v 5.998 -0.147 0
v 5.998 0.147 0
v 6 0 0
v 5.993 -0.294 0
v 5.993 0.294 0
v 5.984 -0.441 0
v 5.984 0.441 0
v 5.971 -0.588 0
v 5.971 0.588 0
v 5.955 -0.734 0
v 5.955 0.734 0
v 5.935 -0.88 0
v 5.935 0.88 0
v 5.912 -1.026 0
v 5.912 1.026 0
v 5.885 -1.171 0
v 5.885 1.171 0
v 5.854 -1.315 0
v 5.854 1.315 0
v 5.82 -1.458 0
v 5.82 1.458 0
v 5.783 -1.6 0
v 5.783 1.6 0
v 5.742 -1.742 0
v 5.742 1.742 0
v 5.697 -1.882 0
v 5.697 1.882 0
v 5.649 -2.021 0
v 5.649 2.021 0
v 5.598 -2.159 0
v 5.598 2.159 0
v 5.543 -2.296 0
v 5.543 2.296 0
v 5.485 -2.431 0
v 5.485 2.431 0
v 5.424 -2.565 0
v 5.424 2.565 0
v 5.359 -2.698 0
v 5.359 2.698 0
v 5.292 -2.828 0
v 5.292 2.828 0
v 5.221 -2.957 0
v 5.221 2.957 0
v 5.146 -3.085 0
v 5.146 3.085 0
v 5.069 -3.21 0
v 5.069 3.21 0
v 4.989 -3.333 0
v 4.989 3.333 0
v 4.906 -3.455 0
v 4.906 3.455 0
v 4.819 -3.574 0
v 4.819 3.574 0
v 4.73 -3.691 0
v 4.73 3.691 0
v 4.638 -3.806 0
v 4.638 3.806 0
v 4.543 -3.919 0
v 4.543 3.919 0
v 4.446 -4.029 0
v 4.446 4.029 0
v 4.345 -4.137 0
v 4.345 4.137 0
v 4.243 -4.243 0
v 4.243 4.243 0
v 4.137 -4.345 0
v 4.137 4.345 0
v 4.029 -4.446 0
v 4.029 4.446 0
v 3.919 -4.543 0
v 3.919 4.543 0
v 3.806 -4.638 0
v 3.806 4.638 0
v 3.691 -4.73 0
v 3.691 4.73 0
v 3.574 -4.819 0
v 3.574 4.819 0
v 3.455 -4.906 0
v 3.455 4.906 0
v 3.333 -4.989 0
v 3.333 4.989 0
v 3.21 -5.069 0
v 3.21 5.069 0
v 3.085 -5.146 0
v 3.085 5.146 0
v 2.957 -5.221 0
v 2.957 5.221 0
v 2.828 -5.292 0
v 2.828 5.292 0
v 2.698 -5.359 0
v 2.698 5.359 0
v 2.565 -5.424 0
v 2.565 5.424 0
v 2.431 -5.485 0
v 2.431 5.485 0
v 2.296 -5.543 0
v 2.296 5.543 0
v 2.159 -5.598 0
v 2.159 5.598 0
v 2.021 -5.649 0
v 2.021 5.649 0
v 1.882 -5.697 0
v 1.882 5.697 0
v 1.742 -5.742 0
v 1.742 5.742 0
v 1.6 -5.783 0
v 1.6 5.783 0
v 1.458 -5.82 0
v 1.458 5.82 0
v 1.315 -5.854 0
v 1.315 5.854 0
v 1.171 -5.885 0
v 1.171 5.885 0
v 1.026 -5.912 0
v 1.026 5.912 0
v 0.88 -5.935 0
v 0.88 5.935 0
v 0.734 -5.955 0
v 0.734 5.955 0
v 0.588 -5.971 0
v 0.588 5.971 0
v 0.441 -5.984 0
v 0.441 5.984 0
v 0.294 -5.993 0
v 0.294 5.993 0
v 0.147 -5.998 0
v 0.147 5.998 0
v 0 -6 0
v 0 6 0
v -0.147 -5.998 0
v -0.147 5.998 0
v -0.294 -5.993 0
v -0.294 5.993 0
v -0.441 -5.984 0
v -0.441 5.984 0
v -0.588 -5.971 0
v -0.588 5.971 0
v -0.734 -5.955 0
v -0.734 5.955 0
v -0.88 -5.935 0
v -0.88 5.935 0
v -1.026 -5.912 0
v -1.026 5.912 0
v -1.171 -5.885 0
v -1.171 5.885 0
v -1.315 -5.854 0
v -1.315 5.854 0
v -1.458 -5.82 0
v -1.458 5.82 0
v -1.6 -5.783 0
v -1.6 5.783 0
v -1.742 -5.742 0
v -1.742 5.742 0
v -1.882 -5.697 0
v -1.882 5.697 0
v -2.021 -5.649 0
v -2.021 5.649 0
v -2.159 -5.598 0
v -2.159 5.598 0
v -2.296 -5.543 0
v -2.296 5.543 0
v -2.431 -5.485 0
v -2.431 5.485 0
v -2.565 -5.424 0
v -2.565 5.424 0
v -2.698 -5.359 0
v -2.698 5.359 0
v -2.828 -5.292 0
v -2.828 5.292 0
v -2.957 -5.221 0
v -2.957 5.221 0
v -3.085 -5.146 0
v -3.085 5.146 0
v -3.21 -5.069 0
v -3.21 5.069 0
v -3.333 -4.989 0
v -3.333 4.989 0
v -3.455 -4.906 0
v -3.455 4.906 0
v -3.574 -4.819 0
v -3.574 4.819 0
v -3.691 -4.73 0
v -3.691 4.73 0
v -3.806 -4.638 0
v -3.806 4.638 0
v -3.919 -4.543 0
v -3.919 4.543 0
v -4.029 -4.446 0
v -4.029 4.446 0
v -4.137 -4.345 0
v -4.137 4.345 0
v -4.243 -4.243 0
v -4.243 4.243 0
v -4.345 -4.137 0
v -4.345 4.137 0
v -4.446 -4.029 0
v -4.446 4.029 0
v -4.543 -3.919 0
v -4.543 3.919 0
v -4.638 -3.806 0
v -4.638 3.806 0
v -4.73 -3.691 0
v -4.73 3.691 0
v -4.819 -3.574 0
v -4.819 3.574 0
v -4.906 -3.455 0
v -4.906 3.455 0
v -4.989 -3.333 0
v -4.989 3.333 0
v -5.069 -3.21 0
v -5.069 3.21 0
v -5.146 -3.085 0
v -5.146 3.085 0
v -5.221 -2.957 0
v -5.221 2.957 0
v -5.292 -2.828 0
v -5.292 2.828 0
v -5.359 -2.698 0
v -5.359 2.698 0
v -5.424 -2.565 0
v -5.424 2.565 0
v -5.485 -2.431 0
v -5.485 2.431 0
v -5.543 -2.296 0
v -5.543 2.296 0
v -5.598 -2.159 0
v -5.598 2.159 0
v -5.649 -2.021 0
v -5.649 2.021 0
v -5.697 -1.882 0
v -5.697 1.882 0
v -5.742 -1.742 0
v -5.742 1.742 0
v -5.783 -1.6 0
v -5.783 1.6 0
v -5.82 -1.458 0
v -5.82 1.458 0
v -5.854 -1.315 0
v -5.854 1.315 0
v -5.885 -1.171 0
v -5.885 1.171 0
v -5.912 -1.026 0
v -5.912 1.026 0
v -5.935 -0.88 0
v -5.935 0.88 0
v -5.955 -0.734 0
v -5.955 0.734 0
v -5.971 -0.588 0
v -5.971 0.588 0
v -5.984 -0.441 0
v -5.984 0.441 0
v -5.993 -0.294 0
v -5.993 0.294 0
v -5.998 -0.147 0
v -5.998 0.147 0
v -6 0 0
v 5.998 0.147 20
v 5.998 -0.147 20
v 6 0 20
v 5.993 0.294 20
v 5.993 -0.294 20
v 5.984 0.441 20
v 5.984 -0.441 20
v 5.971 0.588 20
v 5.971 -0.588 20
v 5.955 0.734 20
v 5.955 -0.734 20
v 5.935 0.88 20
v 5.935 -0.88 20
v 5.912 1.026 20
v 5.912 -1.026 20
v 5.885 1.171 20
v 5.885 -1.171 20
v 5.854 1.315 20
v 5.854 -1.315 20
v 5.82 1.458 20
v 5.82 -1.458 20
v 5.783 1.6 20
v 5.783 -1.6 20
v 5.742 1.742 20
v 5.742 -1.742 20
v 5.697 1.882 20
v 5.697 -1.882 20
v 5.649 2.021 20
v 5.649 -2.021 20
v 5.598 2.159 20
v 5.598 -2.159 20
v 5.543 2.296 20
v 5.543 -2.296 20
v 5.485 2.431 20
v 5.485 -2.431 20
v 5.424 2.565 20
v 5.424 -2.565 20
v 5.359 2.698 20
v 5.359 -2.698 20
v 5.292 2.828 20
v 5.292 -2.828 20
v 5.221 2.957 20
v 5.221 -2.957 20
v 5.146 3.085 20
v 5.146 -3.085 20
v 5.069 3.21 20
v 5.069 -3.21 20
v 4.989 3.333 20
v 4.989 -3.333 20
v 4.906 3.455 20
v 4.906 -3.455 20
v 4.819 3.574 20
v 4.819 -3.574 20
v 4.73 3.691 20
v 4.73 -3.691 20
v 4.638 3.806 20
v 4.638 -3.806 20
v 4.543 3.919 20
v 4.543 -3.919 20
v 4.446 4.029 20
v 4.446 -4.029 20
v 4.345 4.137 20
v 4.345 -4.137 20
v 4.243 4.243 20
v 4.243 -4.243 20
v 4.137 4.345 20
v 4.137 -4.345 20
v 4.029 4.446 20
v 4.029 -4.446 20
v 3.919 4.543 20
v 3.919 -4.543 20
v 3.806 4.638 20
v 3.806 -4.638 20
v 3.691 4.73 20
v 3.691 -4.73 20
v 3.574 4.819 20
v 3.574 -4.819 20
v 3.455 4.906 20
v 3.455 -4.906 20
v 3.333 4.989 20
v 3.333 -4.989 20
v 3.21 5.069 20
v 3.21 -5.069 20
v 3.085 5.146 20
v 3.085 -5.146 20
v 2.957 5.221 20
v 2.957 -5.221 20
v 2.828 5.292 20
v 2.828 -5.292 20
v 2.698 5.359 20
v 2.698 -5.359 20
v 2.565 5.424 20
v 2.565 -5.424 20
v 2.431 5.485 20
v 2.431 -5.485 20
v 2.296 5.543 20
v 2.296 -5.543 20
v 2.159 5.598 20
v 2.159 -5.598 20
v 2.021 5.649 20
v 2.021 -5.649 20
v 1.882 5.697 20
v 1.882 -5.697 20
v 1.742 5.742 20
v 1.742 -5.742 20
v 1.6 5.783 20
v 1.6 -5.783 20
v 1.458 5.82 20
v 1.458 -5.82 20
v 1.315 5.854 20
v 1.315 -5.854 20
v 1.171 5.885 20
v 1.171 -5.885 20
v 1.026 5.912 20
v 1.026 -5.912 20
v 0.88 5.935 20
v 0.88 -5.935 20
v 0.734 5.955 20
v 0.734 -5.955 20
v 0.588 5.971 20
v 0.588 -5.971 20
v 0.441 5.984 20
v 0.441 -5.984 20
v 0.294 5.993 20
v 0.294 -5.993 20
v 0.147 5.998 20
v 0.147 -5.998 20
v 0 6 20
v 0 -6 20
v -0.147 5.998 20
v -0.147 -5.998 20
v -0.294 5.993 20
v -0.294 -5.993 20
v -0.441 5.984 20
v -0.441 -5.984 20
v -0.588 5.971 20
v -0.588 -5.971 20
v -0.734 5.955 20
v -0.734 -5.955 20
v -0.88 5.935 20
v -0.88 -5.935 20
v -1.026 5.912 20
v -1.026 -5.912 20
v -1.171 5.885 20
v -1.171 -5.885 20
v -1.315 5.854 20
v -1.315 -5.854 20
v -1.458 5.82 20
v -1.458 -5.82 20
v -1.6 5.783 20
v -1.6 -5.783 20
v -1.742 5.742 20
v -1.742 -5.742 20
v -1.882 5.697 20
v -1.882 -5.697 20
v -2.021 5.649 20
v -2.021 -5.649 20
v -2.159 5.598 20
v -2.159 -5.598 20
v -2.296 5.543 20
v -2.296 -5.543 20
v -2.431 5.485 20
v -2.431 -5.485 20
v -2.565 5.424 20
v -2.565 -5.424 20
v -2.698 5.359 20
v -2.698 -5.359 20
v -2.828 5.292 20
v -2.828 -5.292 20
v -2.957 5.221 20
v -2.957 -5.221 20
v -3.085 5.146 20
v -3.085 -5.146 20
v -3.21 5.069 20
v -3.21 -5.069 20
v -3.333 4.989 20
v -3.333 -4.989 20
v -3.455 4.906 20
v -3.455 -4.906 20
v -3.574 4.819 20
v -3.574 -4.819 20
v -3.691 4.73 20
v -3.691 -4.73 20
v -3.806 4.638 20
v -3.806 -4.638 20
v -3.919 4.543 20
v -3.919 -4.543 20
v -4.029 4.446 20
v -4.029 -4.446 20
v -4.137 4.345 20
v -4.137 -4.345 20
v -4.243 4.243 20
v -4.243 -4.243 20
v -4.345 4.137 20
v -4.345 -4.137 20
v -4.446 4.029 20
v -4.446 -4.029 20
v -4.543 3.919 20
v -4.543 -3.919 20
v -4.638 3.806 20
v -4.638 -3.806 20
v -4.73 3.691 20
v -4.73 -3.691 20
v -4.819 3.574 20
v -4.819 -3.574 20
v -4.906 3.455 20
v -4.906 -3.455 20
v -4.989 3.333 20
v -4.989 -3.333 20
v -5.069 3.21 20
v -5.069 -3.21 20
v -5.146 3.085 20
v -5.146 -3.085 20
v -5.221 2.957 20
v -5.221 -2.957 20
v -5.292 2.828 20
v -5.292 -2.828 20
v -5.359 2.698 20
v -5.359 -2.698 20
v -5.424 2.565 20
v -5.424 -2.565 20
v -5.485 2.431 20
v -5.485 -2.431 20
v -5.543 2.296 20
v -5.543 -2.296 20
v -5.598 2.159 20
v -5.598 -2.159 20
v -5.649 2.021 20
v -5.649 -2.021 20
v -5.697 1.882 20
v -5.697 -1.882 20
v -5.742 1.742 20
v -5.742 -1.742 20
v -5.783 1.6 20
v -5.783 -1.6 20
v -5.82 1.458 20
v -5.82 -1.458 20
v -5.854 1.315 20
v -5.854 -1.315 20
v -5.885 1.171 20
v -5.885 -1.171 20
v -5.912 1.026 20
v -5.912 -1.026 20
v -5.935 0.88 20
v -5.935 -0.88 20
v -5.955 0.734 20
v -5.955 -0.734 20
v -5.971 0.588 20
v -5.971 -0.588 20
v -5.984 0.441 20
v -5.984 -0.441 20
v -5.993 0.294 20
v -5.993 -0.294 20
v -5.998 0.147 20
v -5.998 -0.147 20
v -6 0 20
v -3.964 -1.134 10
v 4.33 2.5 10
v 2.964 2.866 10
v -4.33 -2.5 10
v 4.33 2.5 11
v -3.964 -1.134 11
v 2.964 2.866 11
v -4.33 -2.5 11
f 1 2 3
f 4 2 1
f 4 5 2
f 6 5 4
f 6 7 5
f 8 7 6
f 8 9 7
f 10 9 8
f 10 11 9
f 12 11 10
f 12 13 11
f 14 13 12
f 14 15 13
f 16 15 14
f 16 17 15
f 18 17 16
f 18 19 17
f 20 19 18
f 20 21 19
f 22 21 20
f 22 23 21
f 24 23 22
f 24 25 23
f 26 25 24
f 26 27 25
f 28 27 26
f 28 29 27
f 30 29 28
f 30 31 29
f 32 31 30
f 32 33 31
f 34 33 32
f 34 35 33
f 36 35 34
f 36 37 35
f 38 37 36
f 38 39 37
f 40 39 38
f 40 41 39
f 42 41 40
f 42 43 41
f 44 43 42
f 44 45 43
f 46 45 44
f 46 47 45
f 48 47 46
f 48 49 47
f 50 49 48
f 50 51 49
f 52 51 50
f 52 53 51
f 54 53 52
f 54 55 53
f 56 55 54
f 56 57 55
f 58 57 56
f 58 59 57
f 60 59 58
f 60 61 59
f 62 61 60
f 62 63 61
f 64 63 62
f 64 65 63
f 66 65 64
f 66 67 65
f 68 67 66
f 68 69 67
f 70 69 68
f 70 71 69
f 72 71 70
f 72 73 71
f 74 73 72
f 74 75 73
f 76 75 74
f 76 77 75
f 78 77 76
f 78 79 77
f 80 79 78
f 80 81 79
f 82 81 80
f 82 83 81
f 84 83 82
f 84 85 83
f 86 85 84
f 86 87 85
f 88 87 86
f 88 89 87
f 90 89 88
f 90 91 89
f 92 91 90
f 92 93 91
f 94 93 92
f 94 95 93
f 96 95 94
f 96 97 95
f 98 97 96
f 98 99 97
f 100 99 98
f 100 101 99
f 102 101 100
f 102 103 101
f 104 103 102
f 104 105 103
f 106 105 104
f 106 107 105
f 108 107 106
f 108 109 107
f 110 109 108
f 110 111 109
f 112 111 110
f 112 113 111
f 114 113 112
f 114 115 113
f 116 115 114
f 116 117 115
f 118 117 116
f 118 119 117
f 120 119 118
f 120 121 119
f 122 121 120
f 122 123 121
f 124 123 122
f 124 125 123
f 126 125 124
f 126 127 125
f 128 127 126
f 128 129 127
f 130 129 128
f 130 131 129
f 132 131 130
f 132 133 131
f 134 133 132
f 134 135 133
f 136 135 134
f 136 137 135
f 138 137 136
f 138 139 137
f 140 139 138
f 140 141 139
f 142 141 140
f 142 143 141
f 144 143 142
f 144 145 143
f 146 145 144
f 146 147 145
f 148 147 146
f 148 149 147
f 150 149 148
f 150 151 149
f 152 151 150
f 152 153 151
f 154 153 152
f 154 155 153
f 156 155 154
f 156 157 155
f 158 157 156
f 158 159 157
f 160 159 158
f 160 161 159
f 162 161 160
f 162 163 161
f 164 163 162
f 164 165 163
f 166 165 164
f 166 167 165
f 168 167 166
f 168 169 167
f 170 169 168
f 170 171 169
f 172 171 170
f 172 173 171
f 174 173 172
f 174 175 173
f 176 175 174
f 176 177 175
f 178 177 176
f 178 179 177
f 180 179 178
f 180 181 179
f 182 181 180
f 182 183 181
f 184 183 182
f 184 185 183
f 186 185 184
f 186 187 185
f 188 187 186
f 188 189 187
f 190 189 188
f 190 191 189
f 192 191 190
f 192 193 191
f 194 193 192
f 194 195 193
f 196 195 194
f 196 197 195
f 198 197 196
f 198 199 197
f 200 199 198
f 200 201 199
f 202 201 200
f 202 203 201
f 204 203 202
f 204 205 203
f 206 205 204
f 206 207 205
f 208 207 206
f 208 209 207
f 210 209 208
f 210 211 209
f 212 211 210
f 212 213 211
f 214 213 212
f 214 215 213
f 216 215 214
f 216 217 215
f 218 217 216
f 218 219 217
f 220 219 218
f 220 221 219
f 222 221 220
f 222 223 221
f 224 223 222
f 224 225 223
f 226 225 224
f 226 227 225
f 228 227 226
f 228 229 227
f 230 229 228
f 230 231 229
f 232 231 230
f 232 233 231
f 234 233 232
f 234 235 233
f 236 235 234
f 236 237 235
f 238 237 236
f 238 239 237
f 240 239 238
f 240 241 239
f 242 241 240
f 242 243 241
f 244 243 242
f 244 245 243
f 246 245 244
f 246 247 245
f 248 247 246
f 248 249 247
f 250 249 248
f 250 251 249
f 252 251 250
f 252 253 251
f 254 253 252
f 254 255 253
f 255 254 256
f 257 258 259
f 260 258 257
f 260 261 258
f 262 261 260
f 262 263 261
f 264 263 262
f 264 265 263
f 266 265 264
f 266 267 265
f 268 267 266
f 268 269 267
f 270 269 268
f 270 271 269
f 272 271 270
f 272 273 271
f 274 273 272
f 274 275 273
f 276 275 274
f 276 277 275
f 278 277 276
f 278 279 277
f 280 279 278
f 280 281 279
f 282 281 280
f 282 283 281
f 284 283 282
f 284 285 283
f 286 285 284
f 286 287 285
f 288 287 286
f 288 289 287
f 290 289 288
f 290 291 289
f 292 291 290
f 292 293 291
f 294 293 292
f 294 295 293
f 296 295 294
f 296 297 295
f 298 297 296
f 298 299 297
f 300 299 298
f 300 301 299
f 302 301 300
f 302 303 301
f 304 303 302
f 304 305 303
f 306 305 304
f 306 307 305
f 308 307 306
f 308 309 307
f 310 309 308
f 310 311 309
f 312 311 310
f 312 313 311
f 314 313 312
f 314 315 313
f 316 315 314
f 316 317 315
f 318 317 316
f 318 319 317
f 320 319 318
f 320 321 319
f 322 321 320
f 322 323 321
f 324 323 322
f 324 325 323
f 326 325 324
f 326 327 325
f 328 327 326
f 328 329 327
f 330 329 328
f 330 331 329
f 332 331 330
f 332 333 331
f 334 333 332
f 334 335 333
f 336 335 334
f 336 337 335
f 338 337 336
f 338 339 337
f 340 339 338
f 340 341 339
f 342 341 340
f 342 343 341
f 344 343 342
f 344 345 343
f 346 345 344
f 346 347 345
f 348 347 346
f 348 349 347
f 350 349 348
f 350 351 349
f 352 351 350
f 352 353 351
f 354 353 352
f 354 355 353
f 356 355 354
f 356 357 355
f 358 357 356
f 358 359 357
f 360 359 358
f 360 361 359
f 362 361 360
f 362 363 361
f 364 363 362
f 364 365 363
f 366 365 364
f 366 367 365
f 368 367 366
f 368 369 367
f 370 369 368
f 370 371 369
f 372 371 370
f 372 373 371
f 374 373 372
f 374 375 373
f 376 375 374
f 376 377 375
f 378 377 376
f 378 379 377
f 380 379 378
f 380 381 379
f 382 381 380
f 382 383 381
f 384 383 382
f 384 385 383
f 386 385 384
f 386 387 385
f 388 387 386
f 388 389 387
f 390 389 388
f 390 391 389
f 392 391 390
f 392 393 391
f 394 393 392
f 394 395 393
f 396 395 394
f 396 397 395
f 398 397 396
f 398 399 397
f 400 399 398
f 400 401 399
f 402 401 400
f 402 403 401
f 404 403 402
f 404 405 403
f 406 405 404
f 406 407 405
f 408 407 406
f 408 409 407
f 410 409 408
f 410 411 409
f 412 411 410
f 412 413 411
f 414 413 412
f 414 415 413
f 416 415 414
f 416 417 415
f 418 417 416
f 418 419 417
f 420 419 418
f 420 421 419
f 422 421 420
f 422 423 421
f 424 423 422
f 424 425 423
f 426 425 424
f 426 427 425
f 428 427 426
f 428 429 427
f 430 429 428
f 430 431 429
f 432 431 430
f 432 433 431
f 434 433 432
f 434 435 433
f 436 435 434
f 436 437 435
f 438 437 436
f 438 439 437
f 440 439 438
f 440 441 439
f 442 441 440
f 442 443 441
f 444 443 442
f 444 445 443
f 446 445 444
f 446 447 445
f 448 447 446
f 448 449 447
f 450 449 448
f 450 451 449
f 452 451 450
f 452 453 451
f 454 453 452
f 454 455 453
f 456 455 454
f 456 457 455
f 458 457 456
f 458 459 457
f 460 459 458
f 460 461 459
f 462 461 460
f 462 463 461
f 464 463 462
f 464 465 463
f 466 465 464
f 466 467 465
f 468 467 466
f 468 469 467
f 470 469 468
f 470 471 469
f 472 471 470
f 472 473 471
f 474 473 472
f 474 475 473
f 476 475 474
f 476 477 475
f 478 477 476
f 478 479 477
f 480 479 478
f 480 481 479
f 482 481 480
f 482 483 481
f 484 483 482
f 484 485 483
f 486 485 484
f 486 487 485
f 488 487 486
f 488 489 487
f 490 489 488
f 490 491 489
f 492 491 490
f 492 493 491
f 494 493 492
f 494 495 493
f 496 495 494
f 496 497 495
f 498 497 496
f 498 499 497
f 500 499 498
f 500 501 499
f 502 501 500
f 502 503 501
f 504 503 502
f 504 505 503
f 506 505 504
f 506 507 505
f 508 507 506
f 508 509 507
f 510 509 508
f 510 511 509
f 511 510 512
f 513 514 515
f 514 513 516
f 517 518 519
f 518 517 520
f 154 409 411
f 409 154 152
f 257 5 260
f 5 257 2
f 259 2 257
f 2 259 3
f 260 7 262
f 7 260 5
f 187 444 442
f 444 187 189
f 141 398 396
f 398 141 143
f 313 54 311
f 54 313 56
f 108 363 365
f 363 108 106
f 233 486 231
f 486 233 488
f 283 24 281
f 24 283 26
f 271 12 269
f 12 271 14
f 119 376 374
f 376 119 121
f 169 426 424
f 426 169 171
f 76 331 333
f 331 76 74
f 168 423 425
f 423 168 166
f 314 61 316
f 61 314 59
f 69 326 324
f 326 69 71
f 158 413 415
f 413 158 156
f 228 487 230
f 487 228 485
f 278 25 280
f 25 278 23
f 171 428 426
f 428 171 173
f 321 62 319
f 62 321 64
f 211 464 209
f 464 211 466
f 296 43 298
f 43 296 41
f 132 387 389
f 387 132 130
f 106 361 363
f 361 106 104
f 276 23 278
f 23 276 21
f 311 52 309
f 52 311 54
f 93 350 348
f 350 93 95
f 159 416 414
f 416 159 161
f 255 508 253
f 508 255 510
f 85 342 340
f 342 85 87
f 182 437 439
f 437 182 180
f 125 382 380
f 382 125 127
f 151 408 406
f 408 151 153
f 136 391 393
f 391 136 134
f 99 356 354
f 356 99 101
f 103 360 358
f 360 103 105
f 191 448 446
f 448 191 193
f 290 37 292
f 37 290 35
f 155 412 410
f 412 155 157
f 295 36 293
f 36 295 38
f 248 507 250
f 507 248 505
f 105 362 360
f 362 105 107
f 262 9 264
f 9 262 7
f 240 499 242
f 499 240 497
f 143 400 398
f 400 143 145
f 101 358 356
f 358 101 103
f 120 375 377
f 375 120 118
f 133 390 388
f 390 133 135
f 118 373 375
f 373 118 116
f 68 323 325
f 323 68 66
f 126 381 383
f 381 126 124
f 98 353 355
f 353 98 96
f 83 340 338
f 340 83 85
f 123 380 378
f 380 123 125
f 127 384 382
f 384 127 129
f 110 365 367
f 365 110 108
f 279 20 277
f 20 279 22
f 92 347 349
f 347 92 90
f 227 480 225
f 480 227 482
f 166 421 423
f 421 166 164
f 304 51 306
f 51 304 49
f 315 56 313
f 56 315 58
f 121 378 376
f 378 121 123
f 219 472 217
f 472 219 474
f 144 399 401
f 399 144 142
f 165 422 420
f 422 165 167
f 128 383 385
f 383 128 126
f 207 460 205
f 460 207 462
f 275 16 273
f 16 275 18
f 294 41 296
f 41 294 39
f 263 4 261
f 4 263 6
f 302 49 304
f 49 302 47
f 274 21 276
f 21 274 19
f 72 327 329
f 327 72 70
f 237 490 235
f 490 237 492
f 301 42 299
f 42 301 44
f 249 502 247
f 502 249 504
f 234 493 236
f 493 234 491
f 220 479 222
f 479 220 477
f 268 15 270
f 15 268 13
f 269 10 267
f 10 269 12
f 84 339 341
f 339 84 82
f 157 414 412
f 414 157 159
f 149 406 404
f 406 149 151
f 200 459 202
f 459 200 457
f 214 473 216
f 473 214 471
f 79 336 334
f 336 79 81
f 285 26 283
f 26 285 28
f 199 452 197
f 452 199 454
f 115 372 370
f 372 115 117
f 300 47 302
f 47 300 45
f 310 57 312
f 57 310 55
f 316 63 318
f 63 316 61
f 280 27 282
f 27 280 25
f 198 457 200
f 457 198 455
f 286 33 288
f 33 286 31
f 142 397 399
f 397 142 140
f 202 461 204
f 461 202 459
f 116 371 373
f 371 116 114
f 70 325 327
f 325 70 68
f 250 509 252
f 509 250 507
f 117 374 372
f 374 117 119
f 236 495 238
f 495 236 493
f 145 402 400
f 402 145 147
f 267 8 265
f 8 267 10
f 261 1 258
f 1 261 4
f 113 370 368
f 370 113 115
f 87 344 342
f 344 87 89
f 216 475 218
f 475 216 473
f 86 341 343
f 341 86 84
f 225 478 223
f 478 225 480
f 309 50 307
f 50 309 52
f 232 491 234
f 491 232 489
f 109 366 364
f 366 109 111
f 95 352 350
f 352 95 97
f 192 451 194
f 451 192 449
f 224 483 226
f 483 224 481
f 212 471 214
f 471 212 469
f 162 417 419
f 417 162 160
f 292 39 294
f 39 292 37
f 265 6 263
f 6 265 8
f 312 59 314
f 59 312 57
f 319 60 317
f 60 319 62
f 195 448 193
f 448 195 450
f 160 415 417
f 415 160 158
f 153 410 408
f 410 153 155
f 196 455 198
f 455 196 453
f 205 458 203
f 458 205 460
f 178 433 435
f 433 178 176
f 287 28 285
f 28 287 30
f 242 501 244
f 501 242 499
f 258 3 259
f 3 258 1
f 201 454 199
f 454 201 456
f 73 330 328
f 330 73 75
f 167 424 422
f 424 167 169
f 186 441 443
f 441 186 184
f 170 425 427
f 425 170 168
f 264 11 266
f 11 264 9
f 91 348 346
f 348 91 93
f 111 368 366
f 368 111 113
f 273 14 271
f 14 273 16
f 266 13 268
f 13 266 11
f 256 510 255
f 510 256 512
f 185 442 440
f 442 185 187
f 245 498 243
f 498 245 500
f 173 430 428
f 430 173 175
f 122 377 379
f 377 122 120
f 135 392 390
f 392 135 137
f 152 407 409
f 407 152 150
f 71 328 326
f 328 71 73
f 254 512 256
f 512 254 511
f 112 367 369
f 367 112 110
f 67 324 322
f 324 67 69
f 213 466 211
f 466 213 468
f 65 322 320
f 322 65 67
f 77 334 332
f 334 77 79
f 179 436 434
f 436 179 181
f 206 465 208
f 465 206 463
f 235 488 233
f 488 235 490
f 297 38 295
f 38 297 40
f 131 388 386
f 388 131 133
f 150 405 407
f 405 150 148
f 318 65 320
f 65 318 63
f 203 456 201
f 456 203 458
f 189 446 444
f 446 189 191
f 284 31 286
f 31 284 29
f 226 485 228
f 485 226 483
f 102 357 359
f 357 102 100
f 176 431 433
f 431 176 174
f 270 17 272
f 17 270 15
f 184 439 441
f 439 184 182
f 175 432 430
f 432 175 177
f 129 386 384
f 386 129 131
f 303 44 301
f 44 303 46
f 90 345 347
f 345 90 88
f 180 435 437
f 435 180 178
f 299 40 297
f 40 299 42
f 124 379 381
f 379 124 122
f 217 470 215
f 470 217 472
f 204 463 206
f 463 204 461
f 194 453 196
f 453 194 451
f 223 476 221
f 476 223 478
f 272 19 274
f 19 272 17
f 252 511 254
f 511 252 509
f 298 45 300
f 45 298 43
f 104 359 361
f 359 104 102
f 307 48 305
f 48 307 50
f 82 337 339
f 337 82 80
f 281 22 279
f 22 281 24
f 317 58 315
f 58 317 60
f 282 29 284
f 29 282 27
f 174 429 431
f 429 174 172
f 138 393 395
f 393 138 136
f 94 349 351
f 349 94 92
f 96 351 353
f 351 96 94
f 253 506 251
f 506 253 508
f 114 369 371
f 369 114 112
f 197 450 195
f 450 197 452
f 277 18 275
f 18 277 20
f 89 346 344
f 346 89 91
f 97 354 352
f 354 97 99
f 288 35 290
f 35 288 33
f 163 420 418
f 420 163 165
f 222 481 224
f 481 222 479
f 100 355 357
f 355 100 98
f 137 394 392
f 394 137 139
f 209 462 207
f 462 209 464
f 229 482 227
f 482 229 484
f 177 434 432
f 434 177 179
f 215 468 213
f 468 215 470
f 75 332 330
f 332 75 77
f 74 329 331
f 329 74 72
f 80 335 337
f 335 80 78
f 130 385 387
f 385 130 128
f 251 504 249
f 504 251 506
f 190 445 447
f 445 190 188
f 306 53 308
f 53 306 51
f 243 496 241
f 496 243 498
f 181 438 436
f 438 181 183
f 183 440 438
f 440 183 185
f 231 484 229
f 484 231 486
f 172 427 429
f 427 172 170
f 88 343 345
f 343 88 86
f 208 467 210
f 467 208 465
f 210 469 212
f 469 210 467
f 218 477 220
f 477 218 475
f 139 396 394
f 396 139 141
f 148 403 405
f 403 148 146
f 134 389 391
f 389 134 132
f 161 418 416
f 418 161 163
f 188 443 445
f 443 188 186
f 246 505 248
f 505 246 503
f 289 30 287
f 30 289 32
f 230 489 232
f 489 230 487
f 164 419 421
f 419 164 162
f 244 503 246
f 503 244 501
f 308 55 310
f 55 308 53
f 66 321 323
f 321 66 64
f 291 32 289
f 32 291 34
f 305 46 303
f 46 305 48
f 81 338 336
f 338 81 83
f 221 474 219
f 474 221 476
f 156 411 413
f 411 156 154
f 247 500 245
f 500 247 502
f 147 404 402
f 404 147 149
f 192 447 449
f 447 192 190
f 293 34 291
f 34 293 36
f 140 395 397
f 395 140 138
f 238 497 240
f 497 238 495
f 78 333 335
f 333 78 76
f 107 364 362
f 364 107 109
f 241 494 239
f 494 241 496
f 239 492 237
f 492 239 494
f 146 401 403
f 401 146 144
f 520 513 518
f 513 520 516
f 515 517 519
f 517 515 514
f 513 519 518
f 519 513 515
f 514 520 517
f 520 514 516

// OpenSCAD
//include <BOSL/constants.scad>
//use <BOSL/masks.scad>

$fn = $preview ? 64 : 256;

// Define parameters for the screw
body_diameter = 10; // diameter of the screw body
body_length = 20; // length of the screw body
thread_pitch = 2; // distance between threads
thread_height = 1; // height of the threads
thread_angle = 30; // angle of the threads (in degrees)

// Create the screw body
difference() {
    cylinder(d=body_diameter, h=body_length); // create a cylinder for the screw body
    translate([0, 0, body_length/2]) cylinder(d=body_diameter*1.2, h=1); // create a flat top for the screw
}

// Create the threads
difference() {
    cylinder(d=body_diameter+thread_height*2, h=body_length); // create a cylinder to cut threads into
    translate([0, 0, body_length/2]) rotate([0, 0, thread_angle]) linear_extrude(height=thread_height) polygon(points=[[-body_diameter/2, 0], [body_diameter/2, 0], [body_diameter/2-thread_pitch/2, thread_height], [-body_diameter/2+thread_pitch/2, thread_height]]); // create a helix-shaped cutout for the threads
}




// # Syntax
//
//  var = value;
//  var = cond ? value_if_true : value_if_false;
//  var = function (x) x + x;
//  module name(…) { … } name();
//  function name(…) = … name();
//  include <….scad>
//  use <….scad>

// # Constants
//
//  PI

// # Special variables
//
//  $fa  minimum angle
//  $fs  minimum size
//  $fn  number of fragments
//  $t   animation step
//  $vpr viewport rotation angles in degrees
//  $vpt viewport translation
//  $vpd viewport camera distance
//  $vpf viewport camera field of view
//  $children number of module children
//  $preview true in F5 preview, false for F6

// # Modifier Characters
//
//  * disable
//  !  show only
//  # highlight / debug
//  % transparent / background

// # 2D
//
//  circle(radius | d=diameter)
//  square(size,center)
//  square([width,height],center)
//  polygon([points])
//  polygon([points],[paths])
//  text(t, size, font, halign, valign, spacing, direction, language, script)
//  import("….ext", convexity)
//  projection(cut)

// # 3D
//
//  sphere(radius | d=diameter)
//  cube(size, center)
//  cube([width,depth,height], center)
//  cylinder(h,r|d,center)
//  cylinder(h,r1|d1,r2|d2,center)
//  polyhedron(points, faces, convexity)
//  import("….ext", convexity)
//  linear_extrude(height,center,convexity,twist,slices)
//  rotate_extrude(angle,convexity)
//  surface(file = "….ext",center,convexity)

// # Transformations
//
//  translate([x,y,z])
//  rotate([x,y,z])
//  rotate(a, [x,y,z])
//  scale([x,y,z])
//  resize([x,y,z],auto,convexity)
//  mirror([x,y,z])
//  multmatrix(m)
//  color("colorname",alpha)
//  color("#hexvalue")
//  color([r,g,b,a])
//  offset(r|delta,chamfer)
//  hull()
//  minkowski(convexity)

// # Lists
//
//  list = […, …, …];  create a list
//  var = list[2];     index a list (from 0)
//  var = list.z;      dot notation indexing (x/y/z)

// # Boolean operations
//
//  union()
//  difference()
//  intersection()

// # List Comprehensions
//
//  Generate [ for (i = range|list) i ]
//  Generate [ for (init;condition;next) i ]
//  Flatten [ each i ]
//  Conditions [ for (i = …) if (condition(i)) i ]
//  Conditions [ for (i = …) if (condition(i)) x else y ]
//  Assignments [ for (i = …) let (assignments) a ]

// # Flow Control
//
//  for (i = [start:end]) { … }
//  for (i = [start:step:end]) { … }
//  for (i = […,…,…]) { … }
//  for (i = …, j = …, …) { … }
//  intersection_for(i = [start:end]) { … }
//  intersection_for(i = [start:step:end]) { … }
//  intersection_for(i = […,…,…]) { … }
//  if (…) { … }
//  let (…) { … }

// # Type test functions
//
//  is_undef
//  is_bool
//  is_num
//  is_string
//  is_list
//  is_function

// # Other
//
//  echo(…)
//  render(convexity)
//  children([idx])
//  assert(condition, message)
